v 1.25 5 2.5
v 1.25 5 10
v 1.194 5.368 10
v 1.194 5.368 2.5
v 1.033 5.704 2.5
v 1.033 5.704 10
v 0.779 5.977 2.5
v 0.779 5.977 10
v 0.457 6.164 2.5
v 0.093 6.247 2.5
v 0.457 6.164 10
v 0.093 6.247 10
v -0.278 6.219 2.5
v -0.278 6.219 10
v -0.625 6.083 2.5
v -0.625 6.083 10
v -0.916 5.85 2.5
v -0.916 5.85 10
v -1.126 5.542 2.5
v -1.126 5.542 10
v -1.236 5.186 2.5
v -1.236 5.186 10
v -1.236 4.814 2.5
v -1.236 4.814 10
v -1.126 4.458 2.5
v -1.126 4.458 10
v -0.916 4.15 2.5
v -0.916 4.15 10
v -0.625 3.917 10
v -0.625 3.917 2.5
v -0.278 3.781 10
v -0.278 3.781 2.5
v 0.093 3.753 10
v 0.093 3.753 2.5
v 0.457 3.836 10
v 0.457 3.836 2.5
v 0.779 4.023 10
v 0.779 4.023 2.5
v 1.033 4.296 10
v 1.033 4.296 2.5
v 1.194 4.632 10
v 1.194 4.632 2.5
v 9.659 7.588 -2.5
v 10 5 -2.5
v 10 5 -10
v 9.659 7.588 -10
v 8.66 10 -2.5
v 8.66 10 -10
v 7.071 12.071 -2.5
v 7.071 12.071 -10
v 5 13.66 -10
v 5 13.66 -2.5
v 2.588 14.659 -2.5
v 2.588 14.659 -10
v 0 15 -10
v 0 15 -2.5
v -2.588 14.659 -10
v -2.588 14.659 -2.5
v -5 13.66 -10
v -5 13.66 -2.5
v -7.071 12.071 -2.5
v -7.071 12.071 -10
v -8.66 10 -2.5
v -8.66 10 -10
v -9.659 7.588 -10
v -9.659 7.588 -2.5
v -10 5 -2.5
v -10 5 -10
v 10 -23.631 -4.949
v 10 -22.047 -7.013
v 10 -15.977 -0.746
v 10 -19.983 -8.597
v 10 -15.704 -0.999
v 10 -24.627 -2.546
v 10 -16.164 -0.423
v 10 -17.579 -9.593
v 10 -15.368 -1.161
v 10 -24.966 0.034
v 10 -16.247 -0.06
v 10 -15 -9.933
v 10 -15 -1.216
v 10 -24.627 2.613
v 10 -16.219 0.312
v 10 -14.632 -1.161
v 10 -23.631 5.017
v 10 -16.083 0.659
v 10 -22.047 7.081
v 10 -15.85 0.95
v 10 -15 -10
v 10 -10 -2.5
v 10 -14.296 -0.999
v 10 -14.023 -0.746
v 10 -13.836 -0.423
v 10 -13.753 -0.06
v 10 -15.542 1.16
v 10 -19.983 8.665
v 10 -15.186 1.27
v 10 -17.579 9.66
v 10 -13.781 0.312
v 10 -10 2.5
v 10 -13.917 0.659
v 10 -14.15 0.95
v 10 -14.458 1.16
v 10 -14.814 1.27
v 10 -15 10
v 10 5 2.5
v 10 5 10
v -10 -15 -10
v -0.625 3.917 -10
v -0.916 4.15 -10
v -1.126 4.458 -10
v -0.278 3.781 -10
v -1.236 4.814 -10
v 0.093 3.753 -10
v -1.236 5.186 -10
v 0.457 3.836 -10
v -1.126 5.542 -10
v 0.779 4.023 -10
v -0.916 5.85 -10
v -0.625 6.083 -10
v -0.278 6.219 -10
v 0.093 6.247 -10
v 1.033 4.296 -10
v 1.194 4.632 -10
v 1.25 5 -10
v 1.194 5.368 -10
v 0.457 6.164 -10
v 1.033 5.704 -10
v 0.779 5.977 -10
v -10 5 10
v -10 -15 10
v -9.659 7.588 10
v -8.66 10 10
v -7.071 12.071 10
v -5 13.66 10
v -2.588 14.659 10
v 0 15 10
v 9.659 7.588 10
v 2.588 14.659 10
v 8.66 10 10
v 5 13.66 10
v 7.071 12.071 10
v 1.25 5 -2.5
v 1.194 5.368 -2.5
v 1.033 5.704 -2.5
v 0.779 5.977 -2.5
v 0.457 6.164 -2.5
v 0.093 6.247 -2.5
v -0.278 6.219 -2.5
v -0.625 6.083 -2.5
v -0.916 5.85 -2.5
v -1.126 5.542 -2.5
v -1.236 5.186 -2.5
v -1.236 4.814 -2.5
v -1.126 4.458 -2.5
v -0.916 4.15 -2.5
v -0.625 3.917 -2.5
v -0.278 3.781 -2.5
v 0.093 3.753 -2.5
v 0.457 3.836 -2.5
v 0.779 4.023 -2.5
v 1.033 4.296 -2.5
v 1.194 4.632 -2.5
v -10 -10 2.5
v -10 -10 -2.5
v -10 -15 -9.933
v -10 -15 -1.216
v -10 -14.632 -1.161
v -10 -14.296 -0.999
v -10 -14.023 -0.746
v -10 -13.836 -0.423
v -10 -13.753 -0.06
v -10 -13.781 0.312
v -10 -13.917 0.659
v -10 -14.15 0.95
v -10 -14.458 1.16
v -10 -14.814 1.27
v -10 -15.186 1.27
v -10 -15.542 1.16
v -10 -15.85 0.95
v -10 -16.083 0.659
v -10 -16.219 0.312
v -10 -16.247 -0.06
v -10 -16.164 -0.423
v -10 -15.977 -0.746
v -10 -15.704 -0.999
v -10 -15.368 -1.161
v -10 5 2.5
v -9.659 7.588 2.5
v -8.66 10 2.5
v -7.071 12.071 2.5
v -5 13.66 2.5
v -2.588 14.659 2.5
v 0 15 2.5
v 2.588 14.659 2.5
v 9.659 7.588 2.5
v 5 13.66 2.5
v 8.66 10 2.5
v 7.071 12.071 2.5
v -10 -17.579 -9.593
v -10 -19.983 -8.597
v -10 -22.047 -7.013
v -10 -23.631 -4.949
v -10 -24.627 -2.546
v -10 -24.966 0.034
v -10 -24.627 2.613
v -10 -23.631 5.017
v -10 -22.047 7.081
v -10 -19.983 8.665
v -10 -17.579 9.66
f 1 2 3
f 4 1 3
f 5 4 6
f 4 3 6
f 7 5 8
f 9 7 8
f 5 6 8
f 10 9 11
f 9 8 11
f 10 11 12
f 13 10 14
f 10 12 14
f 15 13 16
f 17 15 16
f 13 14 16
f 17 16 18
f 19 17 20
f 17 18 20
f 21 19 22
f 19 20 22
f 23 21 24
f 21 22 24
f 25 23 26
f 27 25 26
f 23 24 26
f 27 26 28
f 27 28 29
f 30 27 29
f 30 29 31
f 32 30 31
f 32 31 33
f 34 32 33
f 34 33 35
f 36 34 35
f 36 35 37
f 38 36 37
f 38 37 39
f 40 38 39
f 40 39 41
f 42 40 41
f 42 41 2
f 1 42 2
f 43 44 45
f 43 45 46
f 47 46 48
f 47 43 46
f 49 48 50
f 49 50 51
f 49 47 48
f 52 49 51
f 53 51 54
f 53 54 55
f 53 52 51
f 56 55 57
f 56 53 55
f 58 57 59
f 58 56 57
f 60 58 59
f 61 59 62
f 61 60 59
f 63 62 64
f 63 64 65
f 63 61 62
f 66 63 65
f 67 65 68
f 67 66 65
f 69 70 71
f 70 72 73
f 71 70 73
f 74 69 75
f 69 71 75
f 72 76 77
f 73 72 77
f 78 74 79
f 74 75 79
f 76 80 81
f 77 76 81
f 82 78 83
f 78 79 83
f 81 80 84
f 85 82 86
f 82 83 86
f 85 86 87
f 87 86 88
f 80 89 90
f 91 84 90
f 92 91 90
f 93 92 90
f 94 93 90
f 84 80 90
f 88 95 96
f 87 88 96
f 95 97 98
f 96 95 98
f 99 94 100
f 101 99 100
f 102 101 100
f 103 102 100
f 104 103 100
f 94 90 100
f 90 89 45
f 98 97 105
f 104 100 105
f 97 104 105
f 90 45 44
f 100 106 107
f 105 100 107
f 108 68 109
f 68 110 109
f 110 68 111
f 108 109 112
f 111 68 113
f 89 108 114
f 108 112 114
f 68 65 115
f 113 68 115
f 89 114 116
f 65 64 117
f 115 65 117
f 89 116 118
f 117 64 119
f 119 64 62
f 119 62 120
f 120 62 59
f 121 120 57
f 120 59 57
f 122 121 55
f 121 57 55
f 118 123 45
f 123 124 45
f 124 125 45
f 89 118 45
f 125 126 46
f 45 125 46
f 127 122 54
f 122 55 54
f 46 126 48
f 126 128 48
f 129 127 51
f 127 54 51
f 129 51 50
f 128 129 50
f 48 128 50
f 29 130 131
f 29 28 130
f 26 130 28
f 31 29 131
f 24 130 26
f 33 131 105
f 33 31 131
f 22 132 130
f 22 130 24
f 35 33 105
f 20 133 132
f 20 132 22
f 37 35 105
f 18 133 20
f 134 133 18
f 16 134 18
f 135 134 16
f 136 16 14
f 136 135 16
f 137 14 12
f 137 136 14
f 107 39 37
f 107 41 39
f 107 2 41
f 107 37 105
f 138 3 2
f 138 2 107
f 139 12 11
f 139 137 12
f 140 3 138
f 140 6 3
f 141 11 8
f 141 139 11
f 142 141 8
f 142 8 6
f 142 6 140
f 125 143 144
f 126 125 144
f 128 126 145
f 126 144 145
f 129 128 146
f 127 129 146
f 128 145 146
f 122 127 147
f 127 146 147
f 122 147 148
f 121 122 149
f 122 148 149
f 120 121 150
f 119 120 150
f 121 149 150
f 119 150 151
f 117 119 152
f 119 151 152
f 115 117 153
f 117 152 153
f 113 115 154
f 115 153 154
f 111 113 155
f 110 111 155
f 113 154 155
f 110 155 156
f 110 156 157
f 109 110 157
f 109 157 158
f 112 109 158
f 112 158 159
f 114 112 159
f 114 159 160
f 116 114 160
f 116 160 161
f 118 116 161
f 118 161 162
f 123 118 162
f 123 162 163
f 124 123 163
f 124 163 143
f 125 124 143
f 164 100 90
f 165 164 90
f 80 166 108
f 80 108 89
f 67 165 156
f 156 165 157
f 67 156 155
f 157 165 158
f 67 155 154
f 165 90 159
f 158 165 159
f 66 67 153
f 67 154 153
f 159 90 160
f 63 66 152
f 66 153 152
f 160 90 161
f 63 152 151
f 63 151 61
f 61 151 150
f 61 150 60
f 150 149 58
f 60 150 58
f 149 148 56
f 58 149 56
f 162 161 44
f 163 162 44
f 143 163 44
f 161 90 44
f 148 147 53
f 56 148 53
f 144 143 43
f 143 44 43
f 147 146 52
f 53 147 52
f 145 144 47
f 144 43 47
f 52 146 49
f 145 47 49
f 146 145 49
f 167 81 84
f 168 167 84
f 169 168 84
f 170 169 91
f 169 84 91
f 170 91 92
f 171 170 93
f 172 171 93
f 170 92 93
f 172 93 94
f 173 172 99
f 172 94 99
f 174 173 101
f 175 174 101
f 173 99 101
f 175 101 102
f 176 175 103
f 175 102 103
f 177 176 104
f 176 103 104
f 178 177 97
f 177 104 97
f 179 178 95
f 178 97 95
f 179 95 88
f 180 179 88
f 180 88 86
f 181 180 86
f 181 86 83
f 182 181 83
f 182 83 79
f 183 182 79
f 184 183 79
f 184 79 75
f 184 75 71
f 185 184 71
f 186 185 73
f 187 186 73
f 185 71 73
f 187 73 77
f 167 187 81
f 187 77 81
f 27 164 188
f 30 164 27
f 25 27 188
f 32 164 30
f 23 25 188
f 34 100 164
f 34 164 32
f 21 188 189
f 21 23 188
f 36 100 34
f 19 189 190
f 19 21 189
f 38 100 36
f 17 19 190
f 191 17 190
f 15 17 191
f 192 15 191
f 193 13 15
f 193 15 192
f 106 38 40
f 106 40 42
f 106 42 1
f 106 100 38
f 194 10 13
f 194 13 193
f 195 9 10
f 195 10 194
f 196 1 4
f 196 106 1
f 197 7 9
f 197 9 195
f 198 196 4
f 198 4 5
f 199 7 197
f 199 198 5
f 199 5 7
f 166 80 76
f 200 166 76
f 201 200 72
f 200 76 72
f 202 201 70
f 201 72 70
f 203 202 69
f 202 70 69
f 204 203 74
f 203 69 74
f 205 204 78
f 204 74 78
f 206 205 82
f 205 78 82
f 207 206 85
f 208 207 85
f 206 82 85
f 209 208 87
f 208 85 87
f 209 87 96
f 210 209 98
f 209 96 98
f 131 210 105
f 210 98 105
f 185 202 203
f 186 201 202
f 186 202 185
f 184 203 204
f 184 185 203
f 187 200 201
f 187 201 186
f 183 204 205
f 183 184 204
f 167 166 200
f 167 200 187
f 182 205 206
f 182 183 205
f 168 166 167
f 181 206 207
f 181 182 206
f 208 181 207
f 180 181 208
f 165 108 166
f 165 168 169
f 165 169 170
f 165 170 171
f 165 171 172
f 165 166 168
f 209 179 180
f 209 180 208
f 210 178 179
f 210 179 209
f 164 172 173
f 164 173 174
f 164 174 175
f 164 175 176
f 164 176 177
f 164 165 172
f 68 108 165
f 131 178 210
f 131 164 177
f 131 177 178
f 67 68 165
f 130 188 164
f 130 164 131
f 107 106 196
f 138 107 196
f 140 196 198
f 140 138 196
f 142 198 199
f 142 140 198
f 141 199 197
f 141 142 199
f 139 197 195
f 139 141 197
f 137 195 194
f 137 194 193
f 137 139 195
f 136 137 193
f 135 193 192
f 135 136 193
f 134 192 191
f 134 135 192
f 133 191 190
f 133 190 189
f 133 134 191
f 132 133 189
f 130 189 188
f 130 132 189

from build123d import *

# Parameters (mm, degrees)
BOSS_EXTRUDE1_DEPTH = 10
SKETCH2_W           = 5
SKETCH2_H           = 25
CUT_EXTRUDE1_DEPTH  = 10
SKETCH3_R           = 1.25
CUT_EXTRUDE2_DEPTH  = 27.925824036
BOSS_EXTRUDE3_DEPTH = 20
SKETCH7_R           = 1.25
CUT_EXTRUDE3_DEPTH  = 20


with BuildPart() as part:
    # Sketch1 → Boss-Extrude1 (new, symmetric)
    with BuildSketch(Plane.XY):
        with BuildLine():
            Line((-10, -15), (10, -15))
            Line((10, -15), (10, 5))
            ThreePointArc((10, 5), (0, 15), (-10, 5))
            Line((-10, 5), (-10, -15))
        make_face()
    extrude(amount=BOSS_EXTRUDE1_DEPTH, both=True)

    # Sketch2 → Cut-Extrude1 (cut, symmetric)
    with BuildSketch(Plane(origin=(0, 0, 0), x_dir=(0, 0, -1), z_dir=(1, 0, 0))):
        with Locations((0, 2.5)):
            Rectangle(SKETCH2_W, SKETCH2_H)
    extrude(amount=CUT_EXTRUDE1_DEPTH, both=True, mode=Mode.SUBTRACT)

    # Sketch3 → Cut-Extrude2 (cut, through all)
    with BuildSketch(Plane.XY.offset(10)):
        with Locations((0, 5)):
            Circle(SKETCH3_R)
    extrude(amount=-CUT_EXTRUDE2_DEPTH, mode=Mode.SUBTRACT)

    # Sketch6 → Boss-Extrude3 (add)
    with BuildSketch(Plane(origin=(10, 0, 0), x_dir=(0, 0, -1), z_dir=(1, 0, 0))):
        with BuildLine():
            Line((-10, -15), (9.932520062, -15))
            ThreePointArc((9.932520062, -15), (-0.033739969, -24.966260031), (-10, -15))
        make_face()
    extrude(amount=-BOSS_EXTRUDE3_DEPTH)

    # Sketch7 → Cut-Extrude3 (cut)
    with BuildSketch(Plane(origin=(10, 0, 0), x_dir=(0, 0, -1), z_dir=(1, 0, 0))):
        with Locations((-0.033739969, -15)):
            Circle(SKETCH7_R)
    extrude(amount=-CUT_EXTRUDE3_DEPTH, mode=Mode.SUBTRACT)


solid = part.part
